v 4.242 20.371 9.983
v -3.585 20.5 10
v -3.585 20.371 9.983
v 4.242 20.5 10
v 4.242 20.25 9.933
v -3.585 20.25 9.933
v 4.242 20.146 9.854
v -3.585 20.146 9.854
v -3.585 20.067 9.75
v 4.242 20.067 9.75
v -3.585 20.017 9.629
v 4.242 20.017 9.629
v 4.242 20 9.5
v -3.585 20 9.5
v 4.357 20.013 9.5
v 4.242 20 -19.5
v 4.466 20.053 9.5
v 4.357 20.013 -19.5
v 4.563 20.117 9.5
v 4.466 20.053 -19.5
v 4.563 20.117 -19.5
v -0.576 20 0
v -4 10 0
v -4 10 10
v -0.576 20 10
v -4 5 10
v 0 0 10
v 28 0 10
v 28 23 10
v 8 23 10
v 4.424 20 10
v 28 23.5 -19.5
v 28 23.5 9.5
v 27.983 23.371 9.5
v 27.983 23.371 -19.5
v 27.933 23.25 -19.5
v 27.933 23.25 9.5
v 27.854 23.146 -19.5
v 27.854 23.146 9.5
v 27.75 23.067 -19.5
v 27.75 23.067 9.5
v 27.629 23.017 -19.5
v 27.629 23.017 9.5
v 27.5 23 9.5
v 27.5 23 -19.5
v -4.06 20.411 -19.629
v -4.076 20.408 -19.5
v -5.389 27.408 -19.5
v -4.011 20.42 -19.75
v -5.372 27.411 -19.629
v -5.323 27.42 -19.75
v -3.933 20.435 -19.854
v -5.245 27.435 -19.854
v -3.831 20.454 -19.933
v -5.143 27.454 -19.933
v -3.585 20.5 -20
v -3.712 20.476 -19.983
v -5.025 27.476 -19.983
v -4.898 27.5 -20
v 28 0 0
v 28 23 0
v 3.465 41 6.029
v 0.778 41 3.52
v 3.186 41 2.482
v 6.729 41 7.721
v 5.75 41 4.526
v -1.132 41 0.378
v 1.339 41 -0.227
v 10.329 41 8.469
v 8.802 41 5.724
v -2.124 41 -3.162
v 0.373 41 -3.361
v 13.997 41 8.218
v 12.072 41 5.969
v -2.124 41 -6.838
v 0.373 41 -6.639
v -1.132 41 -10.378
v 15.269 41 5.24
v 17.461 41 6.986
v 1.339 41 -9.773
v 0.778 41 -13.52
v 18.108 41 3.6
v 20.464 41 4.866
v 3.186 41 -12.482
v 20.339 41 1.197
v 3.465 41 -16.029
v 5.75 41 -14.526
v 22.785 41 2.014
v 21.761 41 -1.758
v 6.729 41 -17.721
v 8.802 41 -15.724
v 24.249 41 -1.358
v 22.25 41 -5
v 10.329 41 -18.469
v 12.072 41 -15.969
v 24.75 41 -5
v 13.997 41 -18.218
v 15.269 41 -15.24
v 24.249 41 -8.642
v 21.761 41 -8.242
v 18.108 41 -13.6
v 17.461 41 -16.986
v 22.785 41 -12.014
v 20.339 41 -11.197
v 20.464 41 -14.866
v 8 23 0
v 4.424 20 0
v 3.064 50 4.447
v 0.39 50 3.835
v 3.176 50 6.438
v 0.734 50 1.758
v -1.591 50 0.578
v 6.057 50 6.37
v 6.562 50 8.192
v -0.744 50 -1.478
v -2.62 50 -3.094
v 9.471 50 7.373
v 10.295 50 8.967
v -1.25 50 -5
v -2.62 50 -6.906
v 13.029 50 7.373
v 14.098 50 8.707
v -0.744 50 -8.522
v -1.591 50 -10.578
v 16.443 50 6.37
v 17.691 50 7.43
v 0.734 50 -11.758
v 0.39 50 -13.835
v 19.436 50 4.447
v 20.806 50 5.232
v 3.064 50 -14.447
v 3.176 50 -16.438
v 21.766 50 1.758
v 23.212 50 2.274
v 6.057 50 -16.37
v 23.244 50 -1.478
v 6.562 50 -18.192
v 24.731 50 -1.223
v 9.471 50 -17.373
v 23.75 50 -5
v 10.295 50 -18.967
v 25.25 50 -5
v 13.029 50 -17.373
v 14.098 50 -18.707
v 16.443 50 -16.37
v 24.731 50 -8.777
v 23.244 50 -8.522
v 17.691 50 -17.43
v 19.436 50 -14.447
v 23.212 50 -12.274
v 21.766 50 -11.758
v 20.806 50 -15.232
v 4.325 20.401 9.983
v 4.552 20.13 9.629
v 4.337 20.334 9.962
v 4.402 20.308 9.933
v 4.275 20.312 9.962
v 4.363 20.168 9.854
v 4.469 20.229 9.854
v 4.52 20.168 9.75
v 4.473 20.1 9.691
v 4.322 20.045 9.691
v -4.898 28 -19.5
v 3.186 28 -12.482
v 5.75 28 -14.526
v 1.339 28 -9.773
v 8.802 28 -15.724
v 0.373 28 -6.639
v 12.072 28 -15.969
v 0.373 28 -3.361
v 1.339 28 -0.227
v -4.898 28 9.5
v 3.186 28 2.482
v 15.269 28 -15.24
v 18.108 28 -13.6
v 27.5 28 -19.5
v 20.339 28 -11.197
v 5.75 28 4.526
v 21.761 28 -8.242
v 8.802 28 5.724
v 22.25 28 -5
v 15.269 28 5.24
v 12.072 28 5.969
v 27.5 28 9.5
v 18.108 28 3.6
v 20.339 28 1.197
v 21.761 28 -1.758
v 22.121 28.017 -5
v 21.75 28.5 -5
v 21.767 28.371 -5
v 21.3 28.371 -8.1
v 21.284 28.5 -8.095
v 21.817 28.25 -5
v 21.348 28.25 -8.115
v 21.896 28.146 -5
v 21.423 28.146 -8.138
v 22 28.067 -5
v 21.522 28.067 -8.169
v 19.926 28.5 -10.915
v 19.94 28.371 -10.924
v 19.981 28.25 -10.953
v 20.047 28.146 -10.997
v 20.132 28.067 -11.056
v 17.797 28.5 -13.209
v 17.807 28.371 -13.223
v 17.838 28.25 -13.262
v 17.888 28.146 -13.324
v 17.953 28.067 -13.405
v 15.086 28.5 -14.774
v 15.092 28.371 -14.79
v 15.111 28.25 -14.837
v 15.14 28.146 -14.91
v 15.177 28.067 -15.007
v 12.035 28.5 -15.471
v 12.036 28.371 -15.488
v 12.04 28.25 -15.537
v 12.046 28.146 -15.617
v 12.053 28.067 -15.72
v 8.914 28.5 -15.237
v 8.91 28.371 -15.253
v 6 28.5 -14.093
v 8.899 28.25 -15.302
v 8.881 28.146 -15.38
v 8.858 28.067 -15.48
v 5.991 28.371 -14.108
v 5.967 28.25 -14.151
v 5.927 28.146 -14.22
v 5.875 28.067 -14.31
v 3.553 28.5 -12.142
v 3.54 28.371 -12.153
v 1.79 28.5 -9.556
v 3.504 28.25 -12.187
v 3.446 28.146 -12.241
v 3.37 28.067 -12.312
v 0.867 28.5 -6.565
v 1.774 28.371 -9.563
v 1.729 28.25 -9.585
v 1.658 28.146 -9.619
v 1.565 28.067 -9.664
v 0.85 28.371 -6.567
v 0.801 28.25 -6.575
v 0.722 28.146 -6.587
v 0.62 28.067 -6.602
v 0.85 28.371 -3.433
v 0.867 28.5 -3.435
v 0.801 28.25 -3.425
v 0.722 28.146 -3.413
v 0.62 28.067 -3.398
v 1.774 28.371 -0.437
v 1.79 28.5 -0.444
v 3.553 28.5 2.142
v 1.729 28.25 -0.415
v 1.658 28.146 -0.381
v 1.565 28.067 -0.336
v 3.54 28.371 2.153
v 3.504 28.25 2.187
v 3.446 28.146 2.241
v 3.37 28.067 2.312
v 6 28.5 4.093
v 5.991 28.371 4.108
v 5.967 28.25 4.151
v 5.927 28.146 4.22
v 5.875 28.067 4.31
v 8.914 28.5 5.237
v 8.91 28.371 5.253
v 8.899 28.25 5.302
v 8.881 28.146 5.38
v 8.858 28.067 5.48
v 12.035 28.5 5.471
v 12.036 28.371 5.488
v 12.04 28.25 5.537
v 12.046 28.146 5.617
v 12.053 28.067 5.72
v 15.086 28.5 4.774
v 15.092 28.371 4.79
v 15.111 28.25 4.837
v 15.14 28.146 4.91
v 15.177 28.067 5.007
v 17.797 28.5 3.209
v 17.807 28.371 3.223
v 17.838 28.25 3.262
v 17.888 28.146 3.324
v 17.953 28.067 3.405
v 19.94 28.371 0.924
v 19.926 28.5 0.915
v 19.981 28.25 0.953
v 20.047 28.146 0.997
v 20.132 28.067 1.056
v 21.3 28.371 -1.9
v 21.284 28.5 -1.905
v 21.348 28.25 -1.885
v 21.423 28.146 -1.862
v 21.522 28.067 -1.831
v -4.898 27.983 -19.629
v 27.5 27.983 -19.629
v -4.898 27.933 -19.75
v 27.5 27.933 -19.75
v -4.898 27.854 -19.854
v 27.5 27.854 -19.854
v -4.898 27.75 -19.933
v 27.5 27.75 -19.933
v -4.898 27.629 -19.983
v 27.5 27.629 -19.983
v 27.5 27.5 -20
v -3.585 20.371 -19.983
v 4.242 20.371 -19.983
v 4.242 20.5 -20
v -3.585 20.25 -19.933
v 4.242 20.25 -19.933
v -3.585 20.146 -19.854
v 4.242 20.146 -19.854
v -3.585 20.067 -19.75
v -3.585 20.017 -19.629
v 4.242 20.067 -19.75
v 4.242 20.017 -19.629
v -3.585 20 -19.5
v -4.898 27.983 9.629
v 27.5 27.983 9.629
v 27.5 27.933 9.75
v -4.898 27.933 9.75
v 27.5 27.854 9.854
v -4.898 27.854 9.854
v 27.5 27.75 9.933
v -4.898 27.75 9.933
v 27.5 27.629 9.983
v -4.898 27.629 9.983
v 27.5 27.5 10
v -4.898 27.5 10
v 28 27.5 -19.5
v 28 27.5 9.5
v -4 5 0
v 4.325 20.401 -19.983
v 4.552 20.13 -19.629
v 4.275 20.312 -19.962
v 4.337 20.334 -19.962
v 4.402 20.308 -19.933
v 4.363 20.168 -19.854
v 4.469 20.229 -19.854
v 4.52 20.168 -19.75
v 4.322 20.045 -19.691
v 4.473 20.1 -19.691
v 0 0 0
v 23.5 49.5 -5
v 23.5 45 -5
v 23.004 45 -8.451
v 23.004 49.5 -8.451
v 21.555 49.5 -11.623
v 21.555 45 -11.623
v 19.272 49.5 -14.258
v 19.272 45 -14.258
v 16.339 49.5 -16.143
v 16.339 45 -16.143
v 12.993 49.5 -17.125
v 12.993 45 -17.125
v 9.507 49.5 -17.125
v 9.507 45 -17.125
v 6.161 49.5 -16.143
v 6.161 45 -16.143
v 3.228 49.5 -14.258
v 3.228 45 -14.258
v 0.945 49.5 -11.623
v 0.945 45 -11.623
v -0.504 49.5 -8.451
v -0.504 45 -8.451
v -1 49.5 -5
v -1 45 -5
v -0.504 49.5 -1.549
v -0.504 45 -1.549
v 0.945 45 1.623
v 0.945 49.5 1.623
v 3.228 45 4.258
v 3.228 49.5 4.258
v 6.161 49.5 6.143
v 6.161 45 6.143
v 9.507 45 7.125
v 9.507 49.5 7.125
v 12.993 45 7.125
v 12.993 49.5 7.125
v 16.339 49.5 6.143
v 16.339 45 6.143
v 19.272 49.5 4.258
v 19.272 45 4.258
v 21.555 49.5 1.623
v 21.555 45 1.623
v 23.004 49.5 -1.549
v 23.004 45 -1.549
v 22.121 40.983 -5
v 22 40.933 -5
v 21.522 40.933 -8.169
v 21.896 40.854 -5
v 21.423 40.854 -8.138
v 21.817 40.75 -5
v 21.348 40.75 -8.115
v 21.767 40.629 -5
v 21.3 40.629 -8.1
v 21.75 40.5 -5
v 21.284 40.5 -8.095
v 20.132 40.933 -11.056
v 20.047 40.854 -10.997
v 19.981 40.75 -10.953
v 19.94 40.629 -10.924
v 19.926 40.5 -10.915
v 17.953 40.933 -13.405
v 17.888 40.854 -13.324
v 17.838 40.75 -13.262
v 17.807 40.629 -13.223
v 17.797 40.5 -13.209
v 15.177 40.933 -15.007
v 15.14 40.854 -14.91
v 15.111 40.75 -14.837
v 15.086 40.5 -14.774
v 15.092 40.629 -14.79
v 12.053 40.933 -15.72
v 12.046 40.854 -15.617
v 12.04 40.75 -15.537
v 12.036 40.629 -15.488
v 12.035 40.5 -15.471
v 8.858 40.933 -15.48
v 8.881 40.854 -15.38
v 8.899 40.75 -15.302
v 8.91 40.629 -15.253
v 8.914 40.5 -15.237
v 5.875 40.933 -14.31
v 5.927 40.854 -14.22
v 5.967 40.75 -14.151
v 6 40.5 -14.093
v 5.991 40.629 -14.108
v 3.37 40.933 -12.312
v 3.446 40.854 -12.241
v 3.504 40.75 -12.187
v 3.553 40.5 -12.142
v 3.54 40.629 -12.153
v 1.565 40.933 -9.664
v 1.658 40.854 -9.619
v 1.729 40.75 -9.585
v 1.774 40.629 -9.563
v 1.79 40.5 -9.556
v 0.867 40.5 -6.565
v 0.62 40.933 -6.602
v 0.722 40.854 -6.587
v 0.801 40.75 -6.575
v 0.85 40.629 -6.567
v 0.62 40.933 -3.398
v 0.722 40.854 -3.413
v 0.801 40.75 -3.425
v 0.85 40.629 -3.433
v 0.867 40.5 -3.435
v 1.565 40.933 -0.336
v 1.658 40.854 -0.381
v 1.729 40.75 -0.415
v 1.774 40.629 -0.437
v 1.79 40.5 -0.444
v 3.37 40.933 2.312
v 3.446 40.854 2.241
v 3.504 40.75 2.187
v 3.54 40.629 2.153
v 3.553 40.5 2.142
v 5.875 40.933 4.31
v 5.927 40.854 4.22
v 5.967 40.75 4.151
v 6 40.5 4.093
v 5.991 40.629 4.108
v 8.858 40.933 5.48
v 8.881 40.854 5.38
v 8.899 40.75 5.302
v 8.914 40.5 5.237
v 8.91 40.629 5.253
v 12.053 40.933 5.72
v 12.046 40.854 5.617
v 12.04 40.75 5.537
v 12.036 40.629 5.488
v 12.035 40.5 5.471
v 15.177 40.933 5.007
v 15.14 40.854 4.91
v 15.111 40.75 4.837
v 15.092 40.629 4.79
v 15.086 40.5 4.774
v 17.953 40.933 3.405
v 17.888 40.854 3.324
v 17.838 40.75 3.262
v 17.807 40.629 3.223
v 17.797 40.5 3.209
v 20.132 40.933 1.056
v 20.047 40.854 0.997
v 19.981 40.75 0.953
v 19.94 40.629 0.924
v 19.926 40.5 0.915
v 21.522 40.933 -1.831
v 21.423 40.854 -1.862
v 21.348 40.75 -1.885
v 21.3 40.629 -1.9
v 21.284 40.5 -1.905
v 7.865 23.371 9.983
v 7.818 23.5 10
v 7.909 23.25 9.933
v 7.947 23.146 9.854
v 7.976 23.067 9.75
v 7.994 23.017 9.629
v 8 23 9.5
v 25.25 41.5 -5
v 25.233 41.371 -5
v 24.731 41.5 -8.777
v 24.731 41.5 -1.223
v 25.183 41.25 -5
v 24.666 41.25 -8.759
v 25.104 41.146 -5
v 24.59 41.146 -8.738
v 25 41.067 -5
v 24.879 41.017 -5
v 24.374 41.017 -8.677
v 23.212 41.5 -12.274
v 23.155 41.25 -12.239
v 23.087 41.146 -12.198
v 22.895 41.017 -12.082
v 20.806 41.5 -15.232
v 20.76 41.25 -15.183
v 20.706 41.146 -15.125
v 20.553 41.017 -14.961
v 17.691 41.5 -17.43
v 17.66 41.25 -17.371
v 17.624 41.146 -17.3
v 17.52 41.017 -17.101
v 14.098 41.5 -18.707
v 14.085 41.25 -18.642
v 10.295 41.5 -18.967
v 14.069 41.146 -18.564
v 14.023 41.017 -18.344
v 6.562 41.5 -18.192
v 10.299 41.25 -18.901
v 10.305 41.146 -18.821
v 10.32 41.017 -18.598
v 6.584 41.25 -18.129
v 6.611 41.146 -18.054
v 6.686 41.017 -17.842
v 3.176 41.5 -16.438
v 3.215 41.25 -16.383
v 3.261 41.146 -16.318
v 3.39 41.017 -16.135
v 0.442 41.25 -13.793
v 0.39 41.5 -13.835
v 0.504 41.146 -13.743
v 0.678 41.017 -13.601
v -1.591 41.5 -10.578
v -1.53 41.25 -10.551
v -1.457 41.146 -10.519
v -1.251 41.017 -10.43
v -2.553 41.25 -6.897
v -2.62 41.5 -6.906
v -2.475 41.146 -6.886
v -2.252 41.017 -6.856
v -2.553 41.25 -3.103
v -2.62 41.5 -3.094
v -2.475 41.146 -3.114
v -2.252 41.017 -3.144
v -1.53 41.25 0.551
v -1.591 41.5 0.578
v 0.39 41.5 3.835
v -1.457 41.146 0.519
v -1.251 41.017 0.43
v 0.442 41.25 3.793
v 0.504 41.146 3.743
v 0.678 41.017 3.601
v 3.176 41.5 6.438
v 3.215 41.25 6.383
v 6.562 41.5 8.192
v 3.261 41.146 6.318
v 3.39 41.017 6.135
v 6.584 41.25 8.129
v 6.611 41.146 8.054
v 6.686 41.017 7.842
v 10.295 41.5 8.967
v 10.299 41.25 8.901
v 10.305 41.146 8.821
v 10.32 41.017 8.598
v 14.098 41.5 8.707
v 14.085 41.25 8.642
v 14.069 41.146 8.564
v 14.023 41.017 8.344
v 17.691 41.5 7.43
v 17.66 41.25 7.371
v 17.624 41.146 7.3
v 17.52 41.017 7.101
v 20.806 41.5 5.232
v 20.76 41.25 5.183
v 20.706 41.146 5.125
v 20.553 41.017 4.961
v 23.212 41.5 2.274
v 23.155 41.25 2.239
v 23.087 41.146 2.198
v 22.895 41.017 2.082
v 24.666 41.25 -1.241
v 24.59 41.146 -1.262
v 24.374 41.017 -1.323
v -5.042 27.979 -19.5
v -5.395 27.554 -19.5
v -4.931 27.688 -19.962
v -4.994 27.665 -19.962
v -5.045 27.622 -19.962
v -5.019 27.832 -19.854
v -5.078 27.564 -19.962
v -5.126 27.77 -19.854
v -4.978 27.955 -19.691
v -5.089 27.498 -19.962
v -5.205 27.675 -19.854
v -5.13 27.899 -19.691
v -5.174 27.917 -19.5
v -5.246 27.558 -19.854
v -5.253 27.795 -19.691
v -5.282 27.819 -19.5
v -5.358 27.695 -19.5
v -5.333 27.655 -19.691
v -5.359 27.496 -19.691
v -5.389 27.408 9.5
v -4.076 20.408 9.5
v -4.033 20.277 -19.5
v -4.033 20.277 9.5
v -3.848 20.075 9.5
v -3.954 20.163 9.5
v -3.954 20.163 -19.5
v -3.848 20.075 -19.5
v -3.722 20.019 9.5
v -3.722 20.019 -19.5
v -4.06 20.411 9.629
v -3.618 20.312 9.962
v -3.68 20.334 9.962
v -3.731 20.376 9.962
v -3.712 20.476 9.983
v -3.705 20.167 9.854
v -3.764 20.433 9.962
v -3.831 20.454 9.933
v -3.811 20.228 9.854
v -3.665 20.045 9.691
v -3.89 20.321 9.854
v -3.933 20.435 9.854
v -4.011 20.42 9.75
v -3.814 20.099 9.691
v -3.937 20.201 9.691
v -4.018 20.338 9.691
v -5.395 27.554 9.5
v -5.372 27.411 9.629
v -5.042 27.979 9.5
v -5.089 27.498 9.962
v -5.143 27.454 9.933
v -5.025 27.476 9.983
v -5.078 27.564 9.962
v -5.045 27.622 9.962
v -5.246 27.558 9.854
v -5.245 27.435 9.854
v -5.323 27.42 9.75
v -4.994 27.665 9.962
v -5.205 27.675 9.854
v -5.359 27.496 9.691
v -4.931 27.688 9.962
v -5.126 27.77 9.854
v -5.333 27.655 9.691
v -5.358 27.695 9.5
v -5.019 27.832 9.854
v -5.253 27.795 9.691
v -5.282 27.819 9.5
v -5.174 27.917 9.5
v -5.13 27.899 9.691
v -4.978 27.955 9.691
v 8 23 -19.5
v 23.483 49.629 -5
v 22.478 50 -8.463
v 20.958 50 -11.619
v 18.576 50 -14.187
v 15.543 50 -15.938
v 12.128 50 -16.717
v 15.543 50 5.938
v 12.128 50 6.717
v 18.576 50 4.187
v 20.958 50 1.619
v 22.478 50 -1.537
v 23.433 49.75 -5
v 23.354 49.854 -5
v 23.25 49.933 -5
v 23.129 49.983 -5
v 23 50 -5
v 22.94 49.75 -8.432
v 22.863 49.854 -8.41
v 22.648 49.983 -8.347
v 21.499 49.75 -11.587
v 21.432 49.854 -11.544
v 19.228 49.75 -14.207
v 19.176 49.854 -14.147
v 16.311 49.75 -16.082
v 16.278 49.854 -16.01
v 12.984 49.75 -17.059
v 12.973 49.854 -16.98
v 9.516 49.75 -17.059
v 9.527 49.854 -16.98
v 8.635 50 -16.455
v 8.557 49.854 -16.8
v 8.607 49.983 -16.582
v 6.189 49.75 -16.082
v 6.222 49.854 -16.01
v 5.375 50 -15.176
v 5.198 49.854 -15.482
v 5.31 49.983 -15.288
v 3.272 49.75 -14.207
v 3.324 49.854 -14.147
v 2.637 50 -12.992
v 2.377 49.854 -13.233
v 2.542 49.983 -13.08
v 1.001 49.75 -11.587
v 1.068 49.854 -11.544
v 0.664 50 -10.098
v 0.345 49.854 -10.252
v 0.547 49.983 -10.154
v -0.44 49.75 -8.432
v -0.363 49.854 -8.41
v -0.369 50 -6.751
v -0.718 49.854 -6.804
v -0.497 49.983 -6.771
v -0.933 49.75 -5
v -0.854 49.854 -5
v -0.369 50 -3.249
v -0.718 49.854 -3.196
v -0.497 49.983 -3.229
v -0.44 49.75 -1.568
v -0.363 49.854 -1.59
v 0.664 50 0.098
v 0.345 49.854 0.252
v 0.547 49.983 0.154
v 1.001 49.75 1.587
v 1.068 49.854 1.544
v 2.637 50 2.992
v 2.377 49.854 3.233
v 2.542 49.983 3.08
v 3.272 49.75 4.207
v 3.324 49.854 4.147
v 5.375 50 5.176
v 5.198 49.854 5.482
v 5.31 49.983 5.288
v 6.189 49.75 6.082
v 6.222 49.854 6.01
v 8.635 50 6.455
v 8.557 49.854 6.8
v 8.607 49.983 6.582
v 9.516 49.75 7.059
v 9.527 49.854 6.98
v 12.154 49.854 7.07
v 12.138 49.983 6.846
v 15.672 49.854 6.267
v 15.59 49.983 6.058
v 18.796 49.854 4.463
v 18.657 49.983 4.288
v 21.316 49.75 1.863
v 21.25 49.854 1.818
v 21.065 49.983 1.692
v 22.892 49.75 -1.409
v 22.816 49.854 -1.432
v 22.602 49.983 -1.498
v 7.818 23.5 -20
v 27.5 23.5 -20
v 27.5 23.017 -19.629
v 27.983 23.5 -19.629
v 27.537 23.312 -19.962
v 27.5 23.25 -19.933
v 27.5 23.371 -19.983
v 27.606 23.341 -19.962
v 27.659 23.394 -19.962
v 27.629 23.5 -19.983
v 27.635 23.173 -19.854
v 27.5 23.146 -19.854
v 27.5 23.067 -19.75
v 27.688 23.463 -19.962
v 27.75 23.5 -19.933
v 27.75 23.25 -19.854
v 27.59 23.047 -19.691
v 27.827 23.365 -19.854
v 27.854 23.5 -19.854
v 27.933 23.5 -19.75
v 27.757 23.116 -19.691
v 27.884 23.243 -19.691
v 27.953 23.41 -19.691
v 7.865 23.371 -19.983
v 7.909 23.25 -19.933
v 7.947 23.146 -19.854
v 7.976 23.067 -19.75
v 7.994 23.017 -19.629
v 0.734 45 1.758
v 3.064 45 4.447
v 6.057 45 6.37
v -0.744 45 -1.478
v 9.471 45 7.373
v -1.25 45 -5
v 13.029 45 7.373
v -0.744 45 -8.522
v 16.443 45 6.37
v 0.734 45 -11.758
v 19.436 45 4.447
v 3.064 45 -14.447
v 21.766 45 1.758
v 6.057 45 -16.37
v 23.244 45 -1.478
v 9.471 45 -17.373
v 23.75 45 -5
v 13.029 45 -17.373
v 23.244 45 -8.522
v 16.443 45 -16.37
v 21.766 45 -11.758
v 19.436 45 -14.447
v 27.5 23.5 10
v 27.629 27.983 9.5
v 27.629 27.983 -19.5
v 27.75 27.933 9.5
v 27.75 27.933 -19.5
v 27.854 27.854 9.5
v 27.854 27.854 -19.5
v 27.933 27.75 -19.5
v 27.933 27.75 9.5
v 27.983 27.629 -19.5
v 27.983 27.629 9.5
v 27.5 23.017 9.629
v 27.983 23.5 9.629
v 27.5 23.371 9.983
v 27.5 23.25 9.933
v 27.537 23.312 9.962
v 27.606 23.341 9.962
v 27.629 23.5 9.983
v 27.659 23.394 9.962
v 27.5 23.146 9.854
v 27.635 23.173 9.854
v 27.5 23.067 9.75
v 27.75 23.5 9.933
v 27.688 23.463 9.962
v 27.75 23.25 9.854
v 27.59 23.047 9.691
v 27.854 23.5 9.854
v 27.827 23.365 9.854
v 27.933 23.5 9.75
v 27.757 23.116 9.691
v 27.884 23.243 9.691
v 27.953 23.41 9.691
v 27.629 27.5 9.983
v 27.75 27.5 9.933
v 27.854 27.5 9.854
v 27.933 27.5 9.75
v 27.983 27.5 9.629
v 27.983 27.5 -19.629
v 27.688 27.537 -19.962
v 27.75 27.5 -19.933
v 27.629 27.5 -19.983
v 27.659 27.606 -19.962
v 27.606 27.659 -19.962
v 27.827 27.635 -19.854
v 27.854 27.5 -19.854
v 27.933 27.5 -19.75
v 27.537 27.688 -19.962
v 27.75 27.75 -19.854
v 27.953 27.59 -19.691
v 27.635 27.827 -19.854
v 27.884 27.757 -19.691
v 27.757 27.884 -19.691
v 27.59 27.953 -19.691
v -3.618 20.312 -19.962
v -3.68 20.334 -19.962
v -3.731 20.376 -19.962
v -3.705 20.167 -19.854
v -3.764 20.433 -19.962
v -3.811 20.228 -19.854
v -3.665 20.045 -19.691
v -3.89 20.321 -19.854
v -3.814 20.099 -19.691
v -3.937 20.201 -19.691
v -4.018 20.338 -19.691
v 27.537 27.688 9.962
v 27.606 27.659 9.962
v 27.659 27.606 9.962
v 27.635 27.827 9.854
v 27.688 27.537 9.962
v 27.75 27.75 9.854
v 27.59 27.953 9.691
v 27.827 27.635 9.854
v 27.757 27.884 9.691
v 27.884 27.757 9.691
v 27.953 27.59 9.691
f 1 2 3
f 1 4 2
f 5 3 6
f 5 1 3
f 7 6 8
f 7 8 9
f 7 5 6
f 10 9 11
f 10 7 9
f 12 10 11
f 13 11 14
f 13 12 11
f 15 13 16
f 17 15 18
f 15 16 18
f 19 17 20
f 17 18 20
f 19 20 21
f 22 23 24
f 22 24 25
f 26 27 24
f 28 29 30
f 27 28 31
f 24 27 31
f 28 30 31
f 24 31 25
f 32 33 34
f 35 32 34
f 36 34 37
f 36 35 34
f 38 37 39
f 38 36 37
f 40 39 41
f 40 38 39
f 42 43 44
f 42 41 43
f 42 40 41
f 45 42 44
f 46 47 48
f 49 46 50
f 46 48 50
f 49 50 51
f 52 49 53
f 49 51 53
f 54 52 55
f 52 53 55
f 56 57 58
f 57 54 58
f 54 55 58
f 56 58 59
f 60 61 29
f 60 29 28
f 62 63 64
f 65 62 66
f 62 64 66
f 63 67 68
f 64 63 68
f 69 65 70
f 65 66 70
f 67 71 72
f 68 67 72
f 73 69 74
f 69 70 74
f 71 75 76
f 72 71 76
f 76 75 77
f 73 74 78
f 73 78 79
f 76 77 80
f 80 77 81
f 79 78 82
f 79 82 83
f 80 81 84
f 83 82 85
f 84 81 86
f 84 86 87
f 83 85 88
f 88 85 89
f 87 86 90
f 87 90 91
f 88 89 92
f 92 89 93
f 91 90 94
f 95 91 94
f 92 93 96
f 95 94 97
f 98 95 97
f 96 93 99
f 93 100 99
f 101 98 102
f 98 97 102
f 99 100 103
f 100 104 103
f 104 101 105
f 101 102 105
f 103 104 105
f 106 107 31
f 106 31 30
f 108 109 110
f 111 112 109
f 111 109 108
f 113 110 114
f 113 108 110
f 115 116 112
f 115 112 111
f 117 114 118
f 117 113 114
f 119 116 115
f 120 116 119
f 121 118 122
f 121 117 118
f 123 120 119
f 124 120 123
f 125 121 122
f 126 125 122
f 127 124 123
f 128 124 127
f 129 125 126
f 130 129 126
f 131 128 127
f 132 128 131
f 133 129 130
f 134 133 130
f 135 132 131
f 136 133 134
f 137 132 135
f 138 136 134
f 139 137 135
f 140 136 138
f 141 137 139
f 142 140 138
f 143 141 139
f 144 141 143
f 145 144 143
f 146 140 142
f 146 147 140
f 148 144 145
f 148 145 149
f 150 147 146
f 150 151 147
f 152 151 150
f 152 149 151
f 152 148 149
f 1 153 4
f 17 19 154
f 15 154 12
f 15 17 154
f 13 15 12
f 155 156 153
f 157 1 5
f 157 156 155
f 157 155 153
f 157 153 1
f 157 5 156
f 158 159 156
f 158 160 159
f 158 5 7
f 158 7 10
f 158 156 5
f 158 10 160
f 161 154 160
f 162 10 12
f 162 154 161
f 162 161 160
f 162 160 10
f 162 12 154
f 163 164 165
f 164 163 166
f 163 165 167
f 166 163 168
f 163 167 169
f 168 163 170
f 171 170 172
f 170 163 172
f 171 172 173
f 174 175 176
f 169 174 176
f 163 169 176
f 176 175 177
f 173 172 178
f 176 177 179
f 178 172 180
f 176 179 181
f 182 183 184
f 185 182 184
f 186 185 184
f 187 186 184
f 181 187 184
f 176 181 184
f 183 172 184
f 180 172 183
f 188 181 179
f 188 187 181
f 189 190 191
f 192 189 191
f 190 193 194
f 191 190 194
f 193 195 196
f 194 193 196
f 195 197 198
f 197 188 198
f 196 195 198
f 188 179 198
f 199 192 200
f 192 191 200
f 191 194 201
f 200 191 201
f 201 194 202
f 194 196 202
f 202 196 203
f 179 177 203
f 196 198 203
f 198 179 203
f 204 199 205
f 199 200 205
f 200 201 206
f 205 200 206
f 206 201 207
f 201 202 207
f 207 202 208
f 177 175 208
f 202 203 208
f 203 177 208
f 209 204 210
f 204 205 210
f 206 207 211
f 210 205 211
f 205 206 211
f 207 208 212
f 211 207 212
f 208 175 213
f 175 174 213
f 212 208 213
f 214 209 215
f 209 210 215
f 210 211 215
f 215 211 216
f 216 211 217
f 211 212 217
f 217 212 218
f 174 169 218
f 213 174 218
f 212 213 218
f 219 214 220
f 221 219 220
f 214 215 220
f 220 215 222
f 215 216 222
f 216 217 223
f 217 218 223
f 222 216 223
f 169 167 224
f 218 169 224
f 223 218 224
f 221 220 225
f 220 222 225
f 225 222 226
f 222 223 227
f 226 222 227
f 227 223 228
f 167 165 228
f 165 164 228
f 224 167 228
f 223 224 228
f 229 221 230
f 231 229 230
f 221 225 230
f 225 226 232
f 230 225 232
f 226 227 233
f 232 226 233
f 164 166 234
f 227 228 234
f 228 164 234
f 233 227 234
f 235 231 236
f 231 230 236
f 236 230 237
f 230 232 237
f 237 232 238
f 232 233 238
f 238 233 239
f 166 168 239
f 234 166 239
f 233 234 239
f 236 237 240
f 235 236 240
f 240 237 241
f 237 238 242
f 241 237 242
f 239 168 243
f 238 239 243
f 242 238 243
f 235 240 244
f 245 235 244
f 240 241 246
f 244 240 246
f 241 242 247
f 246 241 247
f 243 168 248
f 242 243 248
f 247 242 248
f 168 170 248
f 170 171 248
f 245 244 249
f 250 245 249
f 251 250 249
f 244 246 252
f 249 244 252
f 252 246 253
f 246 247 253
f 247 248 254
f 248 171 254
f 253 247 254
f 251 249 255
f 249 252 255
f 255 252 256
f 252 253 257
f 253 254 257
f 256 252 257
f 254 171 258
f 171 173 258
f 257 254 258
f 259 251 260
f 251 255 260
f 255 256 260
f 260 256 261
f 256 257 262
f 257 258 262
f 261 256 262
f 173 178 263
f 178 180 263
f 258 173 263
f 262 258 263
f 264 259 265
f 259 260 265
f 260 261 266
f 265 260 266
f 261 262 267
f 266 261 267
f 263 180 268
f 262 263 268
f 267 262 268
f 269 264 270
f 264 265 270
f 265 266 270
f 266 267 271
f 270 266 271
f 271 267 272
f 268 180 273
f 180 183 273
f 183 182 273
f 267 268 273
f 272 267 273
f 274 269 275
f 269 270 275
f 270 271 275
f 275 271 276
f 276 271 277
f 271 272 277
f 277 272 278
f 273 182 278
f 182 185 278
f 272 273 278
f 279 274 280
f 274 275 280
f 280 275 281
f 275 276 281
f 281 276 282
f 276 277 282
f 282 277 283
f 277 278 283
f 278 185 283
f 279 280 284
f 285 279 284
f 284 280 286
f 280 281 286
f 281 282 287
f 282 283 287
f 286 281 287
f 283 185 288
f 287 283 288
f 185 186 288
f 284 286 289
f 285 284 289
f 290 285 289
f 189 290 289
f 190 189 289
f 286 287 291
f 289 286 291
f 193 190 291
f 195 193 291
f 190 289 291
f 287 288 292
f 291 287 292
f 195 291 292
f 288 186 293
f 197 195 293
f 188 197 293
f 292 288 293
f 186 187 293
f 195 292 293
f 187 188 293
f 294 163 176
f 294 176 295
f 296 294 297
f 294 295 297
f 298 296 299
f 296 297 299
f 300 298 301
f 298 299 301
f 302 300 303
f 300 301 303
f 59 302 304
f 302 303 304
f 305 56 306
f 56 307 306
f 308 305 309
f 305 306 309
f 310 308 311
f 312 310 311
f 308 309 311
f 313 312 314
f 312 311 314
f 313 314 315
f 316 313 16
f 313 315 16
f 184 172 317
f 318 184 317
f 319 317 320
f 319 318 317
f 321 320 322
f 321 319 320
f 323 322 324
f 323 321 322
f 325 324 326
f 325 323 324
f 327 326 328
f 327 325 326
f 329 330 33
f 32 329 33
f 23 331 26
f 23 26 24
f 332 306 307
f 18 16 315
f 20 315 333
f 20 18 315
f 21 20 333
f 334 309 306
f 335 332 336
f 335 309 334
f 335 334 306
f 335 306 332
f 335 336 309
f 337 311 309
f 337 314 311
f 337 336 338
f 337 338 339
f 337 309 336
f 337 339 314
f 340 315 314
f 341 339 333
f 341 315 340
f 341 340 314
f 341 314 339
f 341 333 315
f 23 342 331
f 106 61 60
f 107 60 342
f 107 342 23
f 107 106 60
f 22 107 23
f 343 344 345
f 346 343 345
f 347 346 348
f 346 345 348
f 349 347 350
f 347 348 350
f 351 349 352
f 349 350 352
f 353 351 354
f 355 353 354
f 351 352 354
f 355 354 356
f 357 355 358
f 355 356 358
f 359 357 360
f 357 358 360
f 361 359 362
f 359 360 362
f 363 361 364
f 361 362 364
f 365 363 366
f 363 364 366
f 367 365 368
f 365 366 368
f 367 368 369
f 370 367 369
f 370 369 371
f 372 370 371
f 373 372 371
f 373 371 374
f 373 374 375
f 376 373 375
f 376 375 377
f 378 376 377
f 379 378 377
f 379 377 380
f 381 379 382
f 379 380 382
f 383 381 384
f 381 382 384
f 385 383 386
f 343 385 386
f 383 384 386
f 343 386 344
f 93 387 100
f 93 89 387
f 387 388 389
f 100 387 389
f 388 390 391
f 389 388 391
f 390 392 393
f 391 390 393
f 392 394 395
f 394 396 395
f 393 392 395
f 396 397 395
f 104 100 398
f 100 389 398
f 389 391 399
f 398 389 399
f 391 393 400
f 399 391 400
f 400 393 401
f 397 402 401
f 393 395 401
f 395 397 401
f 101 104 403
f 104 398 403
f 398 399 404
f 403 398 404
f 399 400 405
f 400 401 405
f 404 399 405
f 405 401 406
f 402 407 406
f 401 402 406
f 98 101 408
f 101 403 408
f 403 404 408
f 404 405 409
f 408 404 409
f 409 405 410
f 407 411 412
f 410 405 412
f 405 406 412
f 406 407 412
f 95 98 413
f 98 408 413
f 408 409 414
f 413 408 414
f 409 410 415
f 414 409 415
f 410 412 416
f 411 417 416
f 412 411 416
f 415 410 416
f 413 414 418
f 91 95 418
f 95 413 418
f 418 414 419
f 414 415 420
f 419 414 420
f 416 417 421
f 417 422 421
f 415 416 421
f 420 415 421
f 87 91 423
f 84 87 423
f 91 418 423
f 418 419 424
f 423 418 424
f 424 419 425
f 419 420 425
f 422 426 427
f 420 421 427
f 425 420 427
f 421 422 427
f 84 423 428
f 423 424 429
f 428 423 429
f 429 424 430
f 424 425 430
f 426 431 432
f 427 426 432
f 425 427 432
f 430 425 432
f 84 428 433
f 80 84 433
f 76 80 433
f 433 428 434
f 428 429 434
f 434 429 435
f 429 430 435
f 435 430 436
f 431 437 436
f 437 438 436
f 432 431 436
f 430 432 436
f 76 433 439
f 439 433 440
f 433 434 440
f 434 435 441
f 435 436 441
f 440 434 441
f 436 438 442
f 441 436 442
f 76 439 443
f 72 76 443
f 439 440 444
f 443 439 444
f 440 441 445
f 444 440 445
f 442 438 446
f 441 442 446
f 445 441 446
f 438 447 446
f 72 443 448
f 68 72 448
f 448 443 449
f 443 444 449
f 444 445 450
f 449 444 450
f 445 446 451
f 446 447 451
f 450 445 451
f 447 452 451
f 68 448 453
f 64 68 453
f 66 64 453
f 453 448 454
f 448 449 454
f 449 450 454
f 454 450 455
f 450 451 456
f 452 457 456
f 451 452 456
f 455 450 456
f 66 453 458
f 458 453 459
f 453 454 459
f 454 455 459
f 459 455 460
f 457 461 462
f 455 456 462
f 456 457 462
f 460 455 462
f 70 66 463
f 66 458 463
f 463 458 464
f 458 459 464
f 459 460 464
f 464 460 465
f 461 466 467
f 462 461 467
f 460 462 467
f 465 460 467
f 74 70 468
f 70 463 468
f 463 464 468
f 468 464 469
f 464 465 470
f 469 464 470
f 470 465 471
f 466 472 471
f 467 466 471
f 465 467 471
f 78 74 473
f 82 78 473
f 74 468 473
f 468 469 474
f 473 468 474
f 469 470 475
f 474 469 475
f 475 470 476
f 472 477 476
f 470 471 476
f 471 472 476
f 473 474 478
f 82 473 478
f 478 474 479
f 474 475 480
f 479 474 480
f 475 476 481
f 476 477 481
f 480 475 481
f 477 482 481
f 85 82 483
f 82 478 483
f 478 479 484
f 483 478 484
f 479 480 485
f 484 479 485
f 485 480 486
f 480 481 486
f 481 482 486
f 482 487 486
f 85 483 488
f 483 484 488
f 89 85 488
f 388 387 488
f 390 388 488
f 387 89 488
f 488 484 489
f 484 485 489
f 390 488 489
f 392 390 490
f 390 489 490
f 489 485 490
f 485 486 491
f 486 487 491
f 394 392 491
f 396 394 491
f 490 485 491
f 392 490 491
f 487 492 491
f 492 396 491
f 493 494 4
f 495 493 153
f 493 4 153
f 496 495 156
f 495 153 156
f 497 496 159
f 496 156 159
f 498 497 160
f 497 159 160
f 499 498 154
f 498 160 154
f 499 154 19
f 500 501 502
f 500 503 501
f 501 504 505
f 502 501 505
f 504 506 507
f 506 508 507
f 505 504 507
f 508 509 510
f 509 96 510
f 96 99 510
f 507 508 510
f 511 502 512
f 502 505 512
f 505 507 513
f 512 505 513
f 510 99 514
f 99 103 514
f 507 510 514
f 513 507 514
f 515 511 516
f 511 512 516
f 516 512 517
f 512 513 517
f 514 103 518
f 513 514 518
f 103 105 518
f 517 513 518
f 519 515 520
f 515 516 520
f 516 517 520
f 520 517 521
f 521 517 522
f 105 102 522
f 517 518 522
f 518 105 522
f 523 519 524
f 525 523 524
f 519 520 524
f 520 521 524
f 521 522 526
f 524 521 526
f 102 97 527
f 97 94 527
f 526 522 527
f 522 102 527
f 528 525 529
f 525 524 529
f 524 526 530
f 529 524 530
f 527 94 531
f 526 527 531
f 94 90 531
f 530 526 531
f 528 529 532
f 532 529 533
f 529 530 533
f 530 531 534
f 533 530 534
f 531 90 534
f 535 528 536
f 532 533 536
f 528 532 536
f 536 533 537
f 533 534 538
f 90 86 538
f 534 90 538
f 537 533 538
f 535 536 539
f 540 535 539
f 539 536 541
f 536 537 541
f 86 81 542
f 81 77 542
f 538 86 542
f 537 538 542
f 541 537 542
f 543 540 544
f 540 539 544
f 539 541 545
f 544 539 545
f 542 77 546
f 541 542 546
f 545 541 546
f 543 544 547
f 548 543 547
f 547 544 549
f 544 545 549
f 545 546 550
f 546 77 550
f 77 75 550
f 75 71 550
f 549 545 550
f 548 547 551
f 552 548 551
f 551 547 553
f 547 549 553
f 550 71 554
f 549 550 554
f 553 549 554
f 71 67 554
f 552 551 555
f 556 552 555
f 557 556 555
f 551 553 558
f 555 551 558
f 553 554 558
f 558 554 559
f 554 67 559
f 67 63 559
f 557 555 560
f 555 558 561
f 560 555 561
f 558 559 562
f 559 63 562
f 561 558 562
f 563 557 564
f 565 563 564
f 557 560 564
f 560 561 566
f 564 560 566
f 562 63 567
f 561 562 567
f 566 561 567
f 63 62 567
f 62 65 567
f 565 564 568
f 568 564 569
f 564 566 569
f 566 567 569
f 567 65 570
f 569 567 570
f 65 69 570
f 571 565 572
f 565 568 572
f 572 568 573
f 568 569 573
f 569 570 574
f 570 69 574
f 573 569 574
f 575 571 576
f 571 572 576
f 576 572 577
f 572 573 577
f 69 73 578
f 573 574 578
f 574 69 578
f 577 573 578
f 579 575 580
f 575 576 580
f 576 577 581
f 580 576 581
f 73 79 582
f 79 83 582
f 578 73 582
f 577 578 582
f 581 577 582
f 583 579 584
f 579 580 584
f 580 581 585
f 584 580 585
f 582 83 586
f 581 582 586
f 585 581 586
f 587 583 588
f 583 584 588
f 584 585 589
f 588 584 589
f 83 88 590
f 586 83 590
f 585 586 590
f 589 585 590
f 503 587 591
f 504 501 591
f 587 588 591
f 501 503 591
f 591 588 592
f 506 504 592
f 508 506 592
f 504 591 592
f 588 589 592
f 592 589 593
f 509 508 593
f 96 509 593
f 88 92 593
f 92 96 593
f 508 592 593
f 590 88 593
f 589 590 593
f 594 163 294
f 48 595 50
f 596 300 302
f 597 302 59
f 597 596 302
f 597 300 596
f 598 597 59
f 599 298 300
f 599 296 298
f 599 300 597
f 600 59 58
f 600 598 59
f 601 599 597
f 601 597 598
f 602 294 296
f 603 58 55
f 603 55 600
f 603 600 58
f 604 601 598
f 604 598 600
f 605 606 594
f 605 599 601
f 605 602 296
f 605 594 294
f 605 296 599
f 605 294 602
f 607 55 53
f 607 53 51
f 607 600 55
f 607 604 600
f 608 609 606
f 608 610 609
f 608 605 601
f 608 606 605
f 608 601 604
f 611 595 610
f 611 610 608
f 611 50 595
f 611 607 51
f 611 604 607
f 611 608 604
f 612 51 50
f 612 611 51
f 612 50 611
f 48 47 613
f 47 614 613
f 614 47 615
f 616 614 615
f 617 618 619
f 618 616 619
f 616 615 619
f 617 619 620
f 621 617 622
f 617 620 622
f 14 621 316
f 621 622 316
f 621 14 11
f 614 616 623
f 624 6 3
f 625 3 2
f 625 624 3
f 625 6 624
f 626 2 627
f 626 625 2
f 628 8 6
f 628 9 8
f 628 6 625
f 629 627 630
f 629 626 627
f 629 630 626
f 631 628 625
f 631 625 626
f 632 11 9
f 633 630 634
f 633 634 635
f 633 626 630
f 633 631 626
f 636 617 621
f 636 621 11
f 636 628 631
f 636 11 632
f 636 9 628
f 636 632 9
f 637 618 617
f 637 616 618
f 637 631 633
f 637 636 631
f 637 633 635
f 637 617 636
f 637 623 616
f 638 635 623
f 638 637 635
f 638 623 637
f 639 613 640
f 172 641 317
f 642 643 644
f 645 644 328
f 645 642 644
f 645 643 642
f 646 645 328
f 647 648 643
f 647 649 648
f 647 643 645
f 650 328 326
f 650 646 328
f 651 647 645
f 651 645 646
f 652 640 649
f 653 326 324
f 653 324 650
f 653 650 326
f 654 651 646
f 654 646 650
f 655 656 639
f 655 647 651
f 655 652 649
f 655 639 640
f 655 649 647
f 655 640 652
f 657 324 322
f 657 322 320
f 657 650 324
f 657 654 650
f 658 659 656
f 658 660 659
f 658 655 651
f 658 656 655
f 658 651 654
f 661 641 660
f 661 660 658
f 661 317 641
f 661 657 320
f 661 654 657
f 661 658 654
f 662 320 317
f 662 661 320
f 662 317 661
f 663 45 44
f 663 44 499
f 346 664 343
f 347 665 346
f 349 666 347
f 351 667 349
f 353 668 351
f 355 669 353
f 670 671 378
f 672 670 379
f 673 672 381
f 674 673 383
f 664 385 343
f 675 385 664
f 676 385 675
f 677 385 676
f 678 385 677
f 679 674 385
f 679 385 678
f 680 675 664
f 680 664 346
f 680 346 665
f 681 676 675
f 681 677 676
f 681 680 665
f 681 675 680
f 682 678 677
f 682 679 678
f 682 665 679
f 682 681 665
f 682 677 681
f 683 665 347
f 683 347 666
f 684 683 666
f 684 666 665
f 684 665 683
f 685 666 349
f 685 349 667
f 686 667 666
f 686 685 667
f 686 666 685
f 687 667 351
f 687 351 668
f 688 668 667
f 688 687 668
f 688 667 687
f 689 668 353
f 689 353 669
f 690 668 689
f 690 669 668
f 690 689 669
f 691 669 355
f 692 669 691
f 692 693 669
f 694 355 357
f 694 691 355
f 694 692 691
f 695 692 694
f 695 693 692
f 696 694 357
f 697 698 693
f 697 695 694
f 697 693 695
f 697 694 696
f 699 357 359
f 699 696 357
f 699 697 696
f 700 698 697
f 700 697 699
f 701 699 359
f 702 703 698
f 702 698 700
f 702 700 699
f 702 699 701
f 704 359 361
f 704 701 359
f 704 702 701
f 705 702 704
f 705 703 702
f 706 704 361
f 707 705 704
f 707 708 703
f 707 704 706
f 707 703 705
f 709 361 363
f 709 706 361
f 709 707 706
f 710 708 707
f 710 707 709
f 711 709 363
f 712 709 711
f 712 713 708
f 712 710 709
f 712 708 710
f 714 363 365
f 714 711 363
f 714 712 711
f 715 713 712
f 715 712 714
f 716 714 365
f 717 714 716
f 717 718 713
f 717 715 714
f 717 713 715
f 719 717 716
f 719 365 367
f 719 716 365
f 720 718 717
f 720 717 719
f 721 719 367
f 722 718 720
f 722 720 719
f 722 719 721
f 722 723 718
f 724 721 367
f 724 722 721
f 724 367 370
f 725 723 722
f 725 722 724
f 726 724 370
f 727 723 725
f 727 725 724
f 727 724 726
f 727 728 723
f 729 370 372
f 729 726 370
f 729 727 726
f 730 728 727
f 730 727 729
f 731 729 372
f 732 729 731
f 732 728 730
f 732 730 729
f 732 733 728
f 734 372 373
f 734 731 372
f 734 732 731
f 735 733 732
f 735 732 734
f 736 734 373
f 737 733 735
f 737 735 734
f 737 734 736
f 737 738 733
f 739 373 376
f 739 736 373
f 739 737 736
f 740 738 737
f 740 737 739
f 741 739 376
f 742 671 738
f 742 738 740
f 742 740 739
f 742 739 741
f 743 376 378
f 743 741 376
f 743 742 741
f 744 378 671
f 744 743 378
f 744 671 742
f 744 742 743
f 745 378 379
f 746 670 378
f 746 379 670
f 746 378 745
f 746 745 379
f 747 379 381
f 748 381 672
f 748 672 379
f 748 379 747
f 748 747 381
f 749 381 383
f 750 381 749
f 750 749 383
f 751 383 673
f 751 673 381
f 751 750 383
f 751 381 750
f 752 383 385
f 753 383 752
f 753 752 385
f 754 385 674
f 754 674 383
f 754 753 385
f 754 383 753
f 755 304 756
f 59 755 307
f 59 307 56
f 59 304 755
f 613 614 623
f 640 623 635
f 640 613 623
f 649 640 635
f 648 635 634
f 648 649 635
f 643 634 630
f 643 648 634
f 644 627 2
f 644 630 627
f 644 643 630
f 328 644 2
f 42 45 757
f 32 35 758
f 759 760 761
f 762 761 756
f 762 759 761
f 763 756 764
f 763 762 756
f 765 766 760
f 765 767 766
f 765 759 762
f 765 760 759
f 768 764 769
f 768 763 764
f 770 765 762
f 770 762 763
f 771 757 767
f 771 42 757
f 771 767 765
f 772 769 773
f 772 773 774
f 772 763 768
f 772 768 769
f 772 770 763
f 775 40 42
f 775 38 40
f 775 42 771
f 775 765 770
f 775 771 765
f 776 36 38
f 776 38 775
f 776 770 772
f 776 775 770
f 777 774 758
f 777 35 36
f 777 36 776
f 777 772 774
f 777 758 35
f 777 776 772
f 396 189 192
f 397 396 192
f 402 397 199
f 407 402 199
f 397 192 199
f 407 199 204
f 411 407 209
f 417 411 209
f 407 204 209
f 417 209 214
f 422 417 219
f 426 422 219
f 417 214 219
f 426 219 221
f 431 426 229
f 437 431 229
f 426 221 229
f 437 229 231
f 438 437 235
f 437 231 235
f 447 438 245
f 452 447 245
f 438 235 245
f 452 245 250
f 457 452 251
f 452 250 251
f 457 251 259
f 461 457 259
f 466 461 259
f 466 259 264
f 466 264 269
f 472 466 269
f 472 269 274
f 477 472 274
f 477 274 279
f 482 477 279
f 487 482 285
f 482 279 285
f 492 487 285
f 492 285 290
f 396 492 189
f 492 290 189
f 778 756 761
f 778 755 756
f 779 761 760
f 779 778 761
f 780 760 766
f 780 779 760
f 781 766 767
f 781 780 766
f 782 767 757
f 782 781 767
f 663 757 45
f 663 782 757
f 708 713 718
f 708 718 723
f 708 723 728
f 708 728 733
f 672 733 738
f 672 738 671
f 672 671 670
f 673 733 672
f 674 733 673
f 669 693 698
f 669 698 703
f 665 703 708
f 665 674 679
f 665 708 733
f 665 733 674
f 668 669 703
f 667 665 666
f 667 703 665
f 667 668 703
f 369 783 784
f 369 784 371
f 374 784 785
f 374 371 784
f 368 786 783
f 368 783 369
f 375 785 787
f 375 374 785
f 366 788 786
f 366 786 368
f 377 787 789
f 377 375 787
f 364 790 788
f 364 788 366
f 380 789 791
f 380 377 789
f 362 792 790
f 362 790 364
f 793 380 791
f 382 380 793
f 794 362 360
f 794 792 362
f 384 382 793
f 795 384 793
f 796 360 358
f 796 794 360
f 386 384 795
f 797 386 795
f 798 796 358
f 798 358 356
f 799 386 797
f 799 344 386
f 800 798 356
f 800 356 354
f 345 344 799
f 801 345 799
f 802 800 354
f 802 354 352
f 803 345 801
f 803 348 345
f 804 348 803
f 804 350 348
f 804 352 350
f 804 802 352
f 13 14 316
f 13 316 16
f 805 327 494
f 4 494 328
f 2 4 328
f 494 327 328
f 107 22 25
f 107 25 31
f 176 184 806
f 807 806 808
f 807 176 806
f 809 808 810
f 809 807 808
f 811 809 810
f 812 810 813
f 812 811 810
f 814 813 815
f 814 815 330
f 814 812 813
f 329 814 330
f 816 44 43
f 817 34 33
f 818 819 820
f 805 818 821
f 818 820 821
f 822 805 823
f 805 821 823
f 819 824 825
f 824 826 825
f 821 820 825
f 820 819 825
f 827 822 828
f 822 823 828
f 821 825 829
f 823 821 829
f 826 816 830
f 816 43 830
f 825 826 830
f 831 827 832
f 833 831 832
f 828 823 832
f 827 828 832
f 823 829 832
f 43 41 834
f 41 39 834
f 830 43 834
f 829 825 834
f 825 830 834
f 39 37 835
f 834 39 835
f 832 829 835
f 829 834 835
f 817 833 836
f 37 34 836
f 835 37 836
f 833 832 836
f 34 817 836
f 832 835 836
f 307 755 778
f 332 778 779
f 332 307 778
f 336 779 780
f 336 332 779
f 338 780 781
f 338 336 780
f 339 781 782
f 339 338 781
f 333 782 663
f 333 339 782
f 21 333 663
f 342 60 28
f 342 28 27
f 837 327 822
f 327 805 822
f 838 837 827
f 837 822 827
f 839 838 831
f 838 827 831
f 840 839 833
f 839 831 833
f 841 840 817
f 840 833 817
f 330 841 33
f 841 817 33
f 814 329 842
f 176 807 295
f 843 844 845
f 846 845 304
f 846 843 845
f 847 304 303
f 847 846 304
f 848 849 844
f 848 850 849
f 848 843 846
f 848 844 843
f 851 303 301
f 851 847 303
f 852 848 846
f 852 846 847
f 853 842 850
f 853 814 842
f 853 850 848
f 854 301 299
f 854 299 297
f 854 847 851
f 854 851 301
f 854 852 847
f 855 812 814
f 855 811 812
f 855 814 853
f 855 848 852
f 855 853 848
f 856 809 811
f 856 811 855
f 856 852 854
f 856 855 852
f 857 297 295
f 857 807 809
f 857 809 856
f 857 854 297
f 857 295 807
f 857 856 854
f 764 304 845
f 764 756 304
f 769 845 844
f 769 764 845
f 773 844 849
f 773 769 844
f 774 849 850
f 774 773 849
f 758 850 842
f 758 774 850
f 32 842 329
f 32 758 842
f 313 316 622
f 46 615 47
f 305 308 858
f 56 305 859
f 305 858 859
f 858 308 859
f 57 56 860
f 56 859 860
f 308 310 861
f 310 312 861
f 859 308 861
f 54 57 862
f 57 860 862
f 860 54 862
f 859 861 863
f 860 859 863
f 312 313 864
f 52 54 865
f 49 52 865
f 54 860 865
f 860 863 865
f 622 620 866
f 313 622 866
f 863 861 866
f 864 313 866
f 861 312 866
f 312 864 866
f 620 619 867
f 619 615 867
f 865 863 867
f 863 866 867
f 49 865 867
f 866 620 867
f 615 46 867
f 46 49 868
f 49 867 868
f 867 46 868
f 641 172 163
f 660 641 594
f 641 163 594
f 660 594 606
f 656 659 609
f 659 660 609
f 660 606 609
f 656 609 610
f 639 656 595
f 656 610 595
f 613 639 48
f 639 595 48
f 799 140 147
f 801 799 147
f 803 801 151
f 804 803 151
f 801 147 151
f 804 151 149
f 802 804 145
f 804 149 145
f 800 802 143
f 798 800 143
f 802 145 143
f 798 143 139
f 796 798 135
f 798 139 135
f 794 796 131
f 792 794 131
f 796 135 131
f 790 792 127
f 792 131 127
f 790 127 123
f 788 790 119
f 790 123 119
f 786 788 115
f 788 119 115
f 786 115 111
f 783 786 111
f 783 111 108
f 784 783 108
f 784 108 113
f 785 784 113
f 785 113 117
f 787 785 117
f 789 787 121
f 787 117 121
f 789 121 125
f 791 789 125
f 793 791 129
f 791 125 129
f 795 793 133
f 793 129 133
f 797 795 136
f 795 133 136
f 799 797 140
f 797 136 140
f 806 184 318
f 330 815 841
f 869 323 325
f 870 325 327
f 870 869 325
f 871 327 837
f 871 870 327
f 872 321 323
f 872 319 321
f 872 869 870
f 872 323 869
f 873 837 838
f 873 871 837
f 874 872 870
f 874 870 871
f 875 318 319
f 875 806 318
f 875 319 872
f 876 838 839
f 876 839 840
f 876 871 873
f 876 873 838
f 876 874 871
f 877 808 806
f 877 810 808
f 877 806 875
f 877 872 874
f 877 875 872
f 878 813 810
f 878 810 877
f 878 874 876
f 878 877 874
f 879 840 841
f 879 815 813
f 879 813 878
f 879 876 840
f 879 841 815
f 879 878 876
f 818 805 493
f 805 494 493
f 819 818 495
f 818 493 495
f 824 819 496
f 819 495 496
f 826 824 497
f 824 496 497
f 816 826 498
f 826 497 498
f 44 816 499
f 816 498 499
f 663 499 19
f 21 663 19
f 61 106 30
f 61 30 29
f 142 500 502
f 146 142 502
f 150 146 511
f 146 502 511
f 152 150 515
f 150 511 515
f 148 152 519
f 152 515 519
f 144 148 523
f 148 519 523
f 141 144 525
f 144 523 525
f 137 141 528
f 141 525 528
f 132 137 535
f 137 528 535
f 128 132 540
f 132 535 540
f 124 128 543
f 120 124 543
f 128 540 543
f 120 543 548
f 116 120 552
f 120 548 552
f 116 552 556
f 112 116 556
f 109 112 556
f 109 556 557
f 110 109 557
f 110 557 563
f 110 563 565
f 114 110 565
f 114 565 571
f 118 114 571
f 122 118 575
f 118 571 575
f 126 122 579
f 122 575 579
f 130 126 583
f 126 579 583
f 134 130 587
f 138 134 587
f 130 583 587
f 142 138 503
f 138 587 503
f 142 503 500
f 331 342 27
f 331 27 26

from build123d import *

# Parameters (mm, degrees)
BOSS_EXTRUDE1_DEPTH = 10
BOSS_EXTRUDE2_DEPTH = 30
SKETCH4_R           = 10.5
BOSS_EXTRUDE3_DEPTH = 13
SKETCH5_R           = 14
BOSS_EXTRUDE4_DEPTH = 9
SKETCH6_R           = 12.5
CUT_EXTRUDE1_DEPTH  = 5
SKETCH7_R           = 12.25
BOSS_EXTRUDE5_DEPTH = 5
FILLET1_R           = 0.5
FILLET2_R           = 0.5


with BuildPart() as part:
    # Sketch1 → Boss-Extrude1 (new body)
    with BuildSketch(Plane.XY):
        Polygon((0, 0), (-4, 5), (-4, 10), (-0.576361612, 20), (4.423638388, 20), (8, 23), (28, 23), (28, 0), align=None)
    extrude(amount=BOSS_EXTRUDE1_DEPTH)


with BuildPart() as body_2:
    # Sketch3 → Boss-Extrude2 (new body)
    with BuildSketch(Plane.XY.offset(10)):
        Polygon((28, 23), (8, 23), (4.423638388, 20), (-0.576361612, 20), (-4, 20), (-5.5, 28), (28, 28), align=None)
    extrude(amount=-BOSS_EXTRUDE2_DEPTH)

    # Sketch4 → Boss-Extrude3 (add)
    with BuildSketch(Plane(origin=(0, 28, 0), x_dir=(1, 0, 0), z_dir=(0, 1, 0))):
        with Locations((11.25, 5)):
            Circle(SKETCH4_R)
    extrude(amount=BOSS_EXTRUDE3_DEPTH)

    # Sketch5 → Boss-Extrude4 (add)
    with BuildSketch(Plane(origin=(0, 41, 0), x_dir=(1, 0, 0), z_dir=(0, 1, 0))):
        with Locations((11.25, 5)):
            Circle(SKETCH5_R)
    extrude(amount=BOSS_EXTRUDE4_DEPTH)

    # Sketch6 → Cut-Extrude1 (cut)
    with BuildSketch(Plane(origin=(0, 50, 0), x_dir=(1, 0, 0), z_dir=(0, 1, 0))):
        with Locations((11.25, 5)):
            Circle(SKETCH6_R)
    extrude(amount=-CUT_EXTRUDE1_DEPTH, mode=Mode.SUBTRACT)

    # Sketch7 → Boss-Extrude5 (add)
    with BuildSketch(Plane(origin=(0, 45, 0), x_dir=(1, 0, 0), z_dir=(0, 1, 0))):
        with Locations((11.25, 5)):
            Circle(SKETCH7_R)
    extrude(amount=BOSS_EXTRUDE5_DEPTH)

    # Fillet1
    fillet1_edges = [body_2.edges().sort_by_distance(p)[0] for p in [
        (-1, 50, -5),
    ]]
    fillet(fillet1_edges, radius=FILLET1_R)

    # Fillet2
    fillet2_edges = [body_2.edges().sort_by_distance(p)[0] for p in [
        (-4.75, 24, -20),
        (28, 23, -5),
        (4.423638388, 20, -5),
        (-4, 20, -5),
        (-5.5, 28, -5),
        (28, 28, -5),
        (0.211819194, 20, -20),
        (6.211819194, 21.5, -20),
        (18, 23, -20),
        (0.75, 28, -5),
        (0.75, 41, -5),
        (-2.75, 41, -5),
        (28, 25.5, -20),
        (18, 23, 10),
        (11.25, 28, -20),
        (6.211819194, 21.5, 10),
        (0.211819194, 20, 10),
        (-4.75, 24, 10),
        (11.25, 28, 10),
        (28, 25.5, 10),
    ]]
    fillet(fillet2_edges, radius=FILLET2_R)


solid = Compound([part.part, body_2.part])
